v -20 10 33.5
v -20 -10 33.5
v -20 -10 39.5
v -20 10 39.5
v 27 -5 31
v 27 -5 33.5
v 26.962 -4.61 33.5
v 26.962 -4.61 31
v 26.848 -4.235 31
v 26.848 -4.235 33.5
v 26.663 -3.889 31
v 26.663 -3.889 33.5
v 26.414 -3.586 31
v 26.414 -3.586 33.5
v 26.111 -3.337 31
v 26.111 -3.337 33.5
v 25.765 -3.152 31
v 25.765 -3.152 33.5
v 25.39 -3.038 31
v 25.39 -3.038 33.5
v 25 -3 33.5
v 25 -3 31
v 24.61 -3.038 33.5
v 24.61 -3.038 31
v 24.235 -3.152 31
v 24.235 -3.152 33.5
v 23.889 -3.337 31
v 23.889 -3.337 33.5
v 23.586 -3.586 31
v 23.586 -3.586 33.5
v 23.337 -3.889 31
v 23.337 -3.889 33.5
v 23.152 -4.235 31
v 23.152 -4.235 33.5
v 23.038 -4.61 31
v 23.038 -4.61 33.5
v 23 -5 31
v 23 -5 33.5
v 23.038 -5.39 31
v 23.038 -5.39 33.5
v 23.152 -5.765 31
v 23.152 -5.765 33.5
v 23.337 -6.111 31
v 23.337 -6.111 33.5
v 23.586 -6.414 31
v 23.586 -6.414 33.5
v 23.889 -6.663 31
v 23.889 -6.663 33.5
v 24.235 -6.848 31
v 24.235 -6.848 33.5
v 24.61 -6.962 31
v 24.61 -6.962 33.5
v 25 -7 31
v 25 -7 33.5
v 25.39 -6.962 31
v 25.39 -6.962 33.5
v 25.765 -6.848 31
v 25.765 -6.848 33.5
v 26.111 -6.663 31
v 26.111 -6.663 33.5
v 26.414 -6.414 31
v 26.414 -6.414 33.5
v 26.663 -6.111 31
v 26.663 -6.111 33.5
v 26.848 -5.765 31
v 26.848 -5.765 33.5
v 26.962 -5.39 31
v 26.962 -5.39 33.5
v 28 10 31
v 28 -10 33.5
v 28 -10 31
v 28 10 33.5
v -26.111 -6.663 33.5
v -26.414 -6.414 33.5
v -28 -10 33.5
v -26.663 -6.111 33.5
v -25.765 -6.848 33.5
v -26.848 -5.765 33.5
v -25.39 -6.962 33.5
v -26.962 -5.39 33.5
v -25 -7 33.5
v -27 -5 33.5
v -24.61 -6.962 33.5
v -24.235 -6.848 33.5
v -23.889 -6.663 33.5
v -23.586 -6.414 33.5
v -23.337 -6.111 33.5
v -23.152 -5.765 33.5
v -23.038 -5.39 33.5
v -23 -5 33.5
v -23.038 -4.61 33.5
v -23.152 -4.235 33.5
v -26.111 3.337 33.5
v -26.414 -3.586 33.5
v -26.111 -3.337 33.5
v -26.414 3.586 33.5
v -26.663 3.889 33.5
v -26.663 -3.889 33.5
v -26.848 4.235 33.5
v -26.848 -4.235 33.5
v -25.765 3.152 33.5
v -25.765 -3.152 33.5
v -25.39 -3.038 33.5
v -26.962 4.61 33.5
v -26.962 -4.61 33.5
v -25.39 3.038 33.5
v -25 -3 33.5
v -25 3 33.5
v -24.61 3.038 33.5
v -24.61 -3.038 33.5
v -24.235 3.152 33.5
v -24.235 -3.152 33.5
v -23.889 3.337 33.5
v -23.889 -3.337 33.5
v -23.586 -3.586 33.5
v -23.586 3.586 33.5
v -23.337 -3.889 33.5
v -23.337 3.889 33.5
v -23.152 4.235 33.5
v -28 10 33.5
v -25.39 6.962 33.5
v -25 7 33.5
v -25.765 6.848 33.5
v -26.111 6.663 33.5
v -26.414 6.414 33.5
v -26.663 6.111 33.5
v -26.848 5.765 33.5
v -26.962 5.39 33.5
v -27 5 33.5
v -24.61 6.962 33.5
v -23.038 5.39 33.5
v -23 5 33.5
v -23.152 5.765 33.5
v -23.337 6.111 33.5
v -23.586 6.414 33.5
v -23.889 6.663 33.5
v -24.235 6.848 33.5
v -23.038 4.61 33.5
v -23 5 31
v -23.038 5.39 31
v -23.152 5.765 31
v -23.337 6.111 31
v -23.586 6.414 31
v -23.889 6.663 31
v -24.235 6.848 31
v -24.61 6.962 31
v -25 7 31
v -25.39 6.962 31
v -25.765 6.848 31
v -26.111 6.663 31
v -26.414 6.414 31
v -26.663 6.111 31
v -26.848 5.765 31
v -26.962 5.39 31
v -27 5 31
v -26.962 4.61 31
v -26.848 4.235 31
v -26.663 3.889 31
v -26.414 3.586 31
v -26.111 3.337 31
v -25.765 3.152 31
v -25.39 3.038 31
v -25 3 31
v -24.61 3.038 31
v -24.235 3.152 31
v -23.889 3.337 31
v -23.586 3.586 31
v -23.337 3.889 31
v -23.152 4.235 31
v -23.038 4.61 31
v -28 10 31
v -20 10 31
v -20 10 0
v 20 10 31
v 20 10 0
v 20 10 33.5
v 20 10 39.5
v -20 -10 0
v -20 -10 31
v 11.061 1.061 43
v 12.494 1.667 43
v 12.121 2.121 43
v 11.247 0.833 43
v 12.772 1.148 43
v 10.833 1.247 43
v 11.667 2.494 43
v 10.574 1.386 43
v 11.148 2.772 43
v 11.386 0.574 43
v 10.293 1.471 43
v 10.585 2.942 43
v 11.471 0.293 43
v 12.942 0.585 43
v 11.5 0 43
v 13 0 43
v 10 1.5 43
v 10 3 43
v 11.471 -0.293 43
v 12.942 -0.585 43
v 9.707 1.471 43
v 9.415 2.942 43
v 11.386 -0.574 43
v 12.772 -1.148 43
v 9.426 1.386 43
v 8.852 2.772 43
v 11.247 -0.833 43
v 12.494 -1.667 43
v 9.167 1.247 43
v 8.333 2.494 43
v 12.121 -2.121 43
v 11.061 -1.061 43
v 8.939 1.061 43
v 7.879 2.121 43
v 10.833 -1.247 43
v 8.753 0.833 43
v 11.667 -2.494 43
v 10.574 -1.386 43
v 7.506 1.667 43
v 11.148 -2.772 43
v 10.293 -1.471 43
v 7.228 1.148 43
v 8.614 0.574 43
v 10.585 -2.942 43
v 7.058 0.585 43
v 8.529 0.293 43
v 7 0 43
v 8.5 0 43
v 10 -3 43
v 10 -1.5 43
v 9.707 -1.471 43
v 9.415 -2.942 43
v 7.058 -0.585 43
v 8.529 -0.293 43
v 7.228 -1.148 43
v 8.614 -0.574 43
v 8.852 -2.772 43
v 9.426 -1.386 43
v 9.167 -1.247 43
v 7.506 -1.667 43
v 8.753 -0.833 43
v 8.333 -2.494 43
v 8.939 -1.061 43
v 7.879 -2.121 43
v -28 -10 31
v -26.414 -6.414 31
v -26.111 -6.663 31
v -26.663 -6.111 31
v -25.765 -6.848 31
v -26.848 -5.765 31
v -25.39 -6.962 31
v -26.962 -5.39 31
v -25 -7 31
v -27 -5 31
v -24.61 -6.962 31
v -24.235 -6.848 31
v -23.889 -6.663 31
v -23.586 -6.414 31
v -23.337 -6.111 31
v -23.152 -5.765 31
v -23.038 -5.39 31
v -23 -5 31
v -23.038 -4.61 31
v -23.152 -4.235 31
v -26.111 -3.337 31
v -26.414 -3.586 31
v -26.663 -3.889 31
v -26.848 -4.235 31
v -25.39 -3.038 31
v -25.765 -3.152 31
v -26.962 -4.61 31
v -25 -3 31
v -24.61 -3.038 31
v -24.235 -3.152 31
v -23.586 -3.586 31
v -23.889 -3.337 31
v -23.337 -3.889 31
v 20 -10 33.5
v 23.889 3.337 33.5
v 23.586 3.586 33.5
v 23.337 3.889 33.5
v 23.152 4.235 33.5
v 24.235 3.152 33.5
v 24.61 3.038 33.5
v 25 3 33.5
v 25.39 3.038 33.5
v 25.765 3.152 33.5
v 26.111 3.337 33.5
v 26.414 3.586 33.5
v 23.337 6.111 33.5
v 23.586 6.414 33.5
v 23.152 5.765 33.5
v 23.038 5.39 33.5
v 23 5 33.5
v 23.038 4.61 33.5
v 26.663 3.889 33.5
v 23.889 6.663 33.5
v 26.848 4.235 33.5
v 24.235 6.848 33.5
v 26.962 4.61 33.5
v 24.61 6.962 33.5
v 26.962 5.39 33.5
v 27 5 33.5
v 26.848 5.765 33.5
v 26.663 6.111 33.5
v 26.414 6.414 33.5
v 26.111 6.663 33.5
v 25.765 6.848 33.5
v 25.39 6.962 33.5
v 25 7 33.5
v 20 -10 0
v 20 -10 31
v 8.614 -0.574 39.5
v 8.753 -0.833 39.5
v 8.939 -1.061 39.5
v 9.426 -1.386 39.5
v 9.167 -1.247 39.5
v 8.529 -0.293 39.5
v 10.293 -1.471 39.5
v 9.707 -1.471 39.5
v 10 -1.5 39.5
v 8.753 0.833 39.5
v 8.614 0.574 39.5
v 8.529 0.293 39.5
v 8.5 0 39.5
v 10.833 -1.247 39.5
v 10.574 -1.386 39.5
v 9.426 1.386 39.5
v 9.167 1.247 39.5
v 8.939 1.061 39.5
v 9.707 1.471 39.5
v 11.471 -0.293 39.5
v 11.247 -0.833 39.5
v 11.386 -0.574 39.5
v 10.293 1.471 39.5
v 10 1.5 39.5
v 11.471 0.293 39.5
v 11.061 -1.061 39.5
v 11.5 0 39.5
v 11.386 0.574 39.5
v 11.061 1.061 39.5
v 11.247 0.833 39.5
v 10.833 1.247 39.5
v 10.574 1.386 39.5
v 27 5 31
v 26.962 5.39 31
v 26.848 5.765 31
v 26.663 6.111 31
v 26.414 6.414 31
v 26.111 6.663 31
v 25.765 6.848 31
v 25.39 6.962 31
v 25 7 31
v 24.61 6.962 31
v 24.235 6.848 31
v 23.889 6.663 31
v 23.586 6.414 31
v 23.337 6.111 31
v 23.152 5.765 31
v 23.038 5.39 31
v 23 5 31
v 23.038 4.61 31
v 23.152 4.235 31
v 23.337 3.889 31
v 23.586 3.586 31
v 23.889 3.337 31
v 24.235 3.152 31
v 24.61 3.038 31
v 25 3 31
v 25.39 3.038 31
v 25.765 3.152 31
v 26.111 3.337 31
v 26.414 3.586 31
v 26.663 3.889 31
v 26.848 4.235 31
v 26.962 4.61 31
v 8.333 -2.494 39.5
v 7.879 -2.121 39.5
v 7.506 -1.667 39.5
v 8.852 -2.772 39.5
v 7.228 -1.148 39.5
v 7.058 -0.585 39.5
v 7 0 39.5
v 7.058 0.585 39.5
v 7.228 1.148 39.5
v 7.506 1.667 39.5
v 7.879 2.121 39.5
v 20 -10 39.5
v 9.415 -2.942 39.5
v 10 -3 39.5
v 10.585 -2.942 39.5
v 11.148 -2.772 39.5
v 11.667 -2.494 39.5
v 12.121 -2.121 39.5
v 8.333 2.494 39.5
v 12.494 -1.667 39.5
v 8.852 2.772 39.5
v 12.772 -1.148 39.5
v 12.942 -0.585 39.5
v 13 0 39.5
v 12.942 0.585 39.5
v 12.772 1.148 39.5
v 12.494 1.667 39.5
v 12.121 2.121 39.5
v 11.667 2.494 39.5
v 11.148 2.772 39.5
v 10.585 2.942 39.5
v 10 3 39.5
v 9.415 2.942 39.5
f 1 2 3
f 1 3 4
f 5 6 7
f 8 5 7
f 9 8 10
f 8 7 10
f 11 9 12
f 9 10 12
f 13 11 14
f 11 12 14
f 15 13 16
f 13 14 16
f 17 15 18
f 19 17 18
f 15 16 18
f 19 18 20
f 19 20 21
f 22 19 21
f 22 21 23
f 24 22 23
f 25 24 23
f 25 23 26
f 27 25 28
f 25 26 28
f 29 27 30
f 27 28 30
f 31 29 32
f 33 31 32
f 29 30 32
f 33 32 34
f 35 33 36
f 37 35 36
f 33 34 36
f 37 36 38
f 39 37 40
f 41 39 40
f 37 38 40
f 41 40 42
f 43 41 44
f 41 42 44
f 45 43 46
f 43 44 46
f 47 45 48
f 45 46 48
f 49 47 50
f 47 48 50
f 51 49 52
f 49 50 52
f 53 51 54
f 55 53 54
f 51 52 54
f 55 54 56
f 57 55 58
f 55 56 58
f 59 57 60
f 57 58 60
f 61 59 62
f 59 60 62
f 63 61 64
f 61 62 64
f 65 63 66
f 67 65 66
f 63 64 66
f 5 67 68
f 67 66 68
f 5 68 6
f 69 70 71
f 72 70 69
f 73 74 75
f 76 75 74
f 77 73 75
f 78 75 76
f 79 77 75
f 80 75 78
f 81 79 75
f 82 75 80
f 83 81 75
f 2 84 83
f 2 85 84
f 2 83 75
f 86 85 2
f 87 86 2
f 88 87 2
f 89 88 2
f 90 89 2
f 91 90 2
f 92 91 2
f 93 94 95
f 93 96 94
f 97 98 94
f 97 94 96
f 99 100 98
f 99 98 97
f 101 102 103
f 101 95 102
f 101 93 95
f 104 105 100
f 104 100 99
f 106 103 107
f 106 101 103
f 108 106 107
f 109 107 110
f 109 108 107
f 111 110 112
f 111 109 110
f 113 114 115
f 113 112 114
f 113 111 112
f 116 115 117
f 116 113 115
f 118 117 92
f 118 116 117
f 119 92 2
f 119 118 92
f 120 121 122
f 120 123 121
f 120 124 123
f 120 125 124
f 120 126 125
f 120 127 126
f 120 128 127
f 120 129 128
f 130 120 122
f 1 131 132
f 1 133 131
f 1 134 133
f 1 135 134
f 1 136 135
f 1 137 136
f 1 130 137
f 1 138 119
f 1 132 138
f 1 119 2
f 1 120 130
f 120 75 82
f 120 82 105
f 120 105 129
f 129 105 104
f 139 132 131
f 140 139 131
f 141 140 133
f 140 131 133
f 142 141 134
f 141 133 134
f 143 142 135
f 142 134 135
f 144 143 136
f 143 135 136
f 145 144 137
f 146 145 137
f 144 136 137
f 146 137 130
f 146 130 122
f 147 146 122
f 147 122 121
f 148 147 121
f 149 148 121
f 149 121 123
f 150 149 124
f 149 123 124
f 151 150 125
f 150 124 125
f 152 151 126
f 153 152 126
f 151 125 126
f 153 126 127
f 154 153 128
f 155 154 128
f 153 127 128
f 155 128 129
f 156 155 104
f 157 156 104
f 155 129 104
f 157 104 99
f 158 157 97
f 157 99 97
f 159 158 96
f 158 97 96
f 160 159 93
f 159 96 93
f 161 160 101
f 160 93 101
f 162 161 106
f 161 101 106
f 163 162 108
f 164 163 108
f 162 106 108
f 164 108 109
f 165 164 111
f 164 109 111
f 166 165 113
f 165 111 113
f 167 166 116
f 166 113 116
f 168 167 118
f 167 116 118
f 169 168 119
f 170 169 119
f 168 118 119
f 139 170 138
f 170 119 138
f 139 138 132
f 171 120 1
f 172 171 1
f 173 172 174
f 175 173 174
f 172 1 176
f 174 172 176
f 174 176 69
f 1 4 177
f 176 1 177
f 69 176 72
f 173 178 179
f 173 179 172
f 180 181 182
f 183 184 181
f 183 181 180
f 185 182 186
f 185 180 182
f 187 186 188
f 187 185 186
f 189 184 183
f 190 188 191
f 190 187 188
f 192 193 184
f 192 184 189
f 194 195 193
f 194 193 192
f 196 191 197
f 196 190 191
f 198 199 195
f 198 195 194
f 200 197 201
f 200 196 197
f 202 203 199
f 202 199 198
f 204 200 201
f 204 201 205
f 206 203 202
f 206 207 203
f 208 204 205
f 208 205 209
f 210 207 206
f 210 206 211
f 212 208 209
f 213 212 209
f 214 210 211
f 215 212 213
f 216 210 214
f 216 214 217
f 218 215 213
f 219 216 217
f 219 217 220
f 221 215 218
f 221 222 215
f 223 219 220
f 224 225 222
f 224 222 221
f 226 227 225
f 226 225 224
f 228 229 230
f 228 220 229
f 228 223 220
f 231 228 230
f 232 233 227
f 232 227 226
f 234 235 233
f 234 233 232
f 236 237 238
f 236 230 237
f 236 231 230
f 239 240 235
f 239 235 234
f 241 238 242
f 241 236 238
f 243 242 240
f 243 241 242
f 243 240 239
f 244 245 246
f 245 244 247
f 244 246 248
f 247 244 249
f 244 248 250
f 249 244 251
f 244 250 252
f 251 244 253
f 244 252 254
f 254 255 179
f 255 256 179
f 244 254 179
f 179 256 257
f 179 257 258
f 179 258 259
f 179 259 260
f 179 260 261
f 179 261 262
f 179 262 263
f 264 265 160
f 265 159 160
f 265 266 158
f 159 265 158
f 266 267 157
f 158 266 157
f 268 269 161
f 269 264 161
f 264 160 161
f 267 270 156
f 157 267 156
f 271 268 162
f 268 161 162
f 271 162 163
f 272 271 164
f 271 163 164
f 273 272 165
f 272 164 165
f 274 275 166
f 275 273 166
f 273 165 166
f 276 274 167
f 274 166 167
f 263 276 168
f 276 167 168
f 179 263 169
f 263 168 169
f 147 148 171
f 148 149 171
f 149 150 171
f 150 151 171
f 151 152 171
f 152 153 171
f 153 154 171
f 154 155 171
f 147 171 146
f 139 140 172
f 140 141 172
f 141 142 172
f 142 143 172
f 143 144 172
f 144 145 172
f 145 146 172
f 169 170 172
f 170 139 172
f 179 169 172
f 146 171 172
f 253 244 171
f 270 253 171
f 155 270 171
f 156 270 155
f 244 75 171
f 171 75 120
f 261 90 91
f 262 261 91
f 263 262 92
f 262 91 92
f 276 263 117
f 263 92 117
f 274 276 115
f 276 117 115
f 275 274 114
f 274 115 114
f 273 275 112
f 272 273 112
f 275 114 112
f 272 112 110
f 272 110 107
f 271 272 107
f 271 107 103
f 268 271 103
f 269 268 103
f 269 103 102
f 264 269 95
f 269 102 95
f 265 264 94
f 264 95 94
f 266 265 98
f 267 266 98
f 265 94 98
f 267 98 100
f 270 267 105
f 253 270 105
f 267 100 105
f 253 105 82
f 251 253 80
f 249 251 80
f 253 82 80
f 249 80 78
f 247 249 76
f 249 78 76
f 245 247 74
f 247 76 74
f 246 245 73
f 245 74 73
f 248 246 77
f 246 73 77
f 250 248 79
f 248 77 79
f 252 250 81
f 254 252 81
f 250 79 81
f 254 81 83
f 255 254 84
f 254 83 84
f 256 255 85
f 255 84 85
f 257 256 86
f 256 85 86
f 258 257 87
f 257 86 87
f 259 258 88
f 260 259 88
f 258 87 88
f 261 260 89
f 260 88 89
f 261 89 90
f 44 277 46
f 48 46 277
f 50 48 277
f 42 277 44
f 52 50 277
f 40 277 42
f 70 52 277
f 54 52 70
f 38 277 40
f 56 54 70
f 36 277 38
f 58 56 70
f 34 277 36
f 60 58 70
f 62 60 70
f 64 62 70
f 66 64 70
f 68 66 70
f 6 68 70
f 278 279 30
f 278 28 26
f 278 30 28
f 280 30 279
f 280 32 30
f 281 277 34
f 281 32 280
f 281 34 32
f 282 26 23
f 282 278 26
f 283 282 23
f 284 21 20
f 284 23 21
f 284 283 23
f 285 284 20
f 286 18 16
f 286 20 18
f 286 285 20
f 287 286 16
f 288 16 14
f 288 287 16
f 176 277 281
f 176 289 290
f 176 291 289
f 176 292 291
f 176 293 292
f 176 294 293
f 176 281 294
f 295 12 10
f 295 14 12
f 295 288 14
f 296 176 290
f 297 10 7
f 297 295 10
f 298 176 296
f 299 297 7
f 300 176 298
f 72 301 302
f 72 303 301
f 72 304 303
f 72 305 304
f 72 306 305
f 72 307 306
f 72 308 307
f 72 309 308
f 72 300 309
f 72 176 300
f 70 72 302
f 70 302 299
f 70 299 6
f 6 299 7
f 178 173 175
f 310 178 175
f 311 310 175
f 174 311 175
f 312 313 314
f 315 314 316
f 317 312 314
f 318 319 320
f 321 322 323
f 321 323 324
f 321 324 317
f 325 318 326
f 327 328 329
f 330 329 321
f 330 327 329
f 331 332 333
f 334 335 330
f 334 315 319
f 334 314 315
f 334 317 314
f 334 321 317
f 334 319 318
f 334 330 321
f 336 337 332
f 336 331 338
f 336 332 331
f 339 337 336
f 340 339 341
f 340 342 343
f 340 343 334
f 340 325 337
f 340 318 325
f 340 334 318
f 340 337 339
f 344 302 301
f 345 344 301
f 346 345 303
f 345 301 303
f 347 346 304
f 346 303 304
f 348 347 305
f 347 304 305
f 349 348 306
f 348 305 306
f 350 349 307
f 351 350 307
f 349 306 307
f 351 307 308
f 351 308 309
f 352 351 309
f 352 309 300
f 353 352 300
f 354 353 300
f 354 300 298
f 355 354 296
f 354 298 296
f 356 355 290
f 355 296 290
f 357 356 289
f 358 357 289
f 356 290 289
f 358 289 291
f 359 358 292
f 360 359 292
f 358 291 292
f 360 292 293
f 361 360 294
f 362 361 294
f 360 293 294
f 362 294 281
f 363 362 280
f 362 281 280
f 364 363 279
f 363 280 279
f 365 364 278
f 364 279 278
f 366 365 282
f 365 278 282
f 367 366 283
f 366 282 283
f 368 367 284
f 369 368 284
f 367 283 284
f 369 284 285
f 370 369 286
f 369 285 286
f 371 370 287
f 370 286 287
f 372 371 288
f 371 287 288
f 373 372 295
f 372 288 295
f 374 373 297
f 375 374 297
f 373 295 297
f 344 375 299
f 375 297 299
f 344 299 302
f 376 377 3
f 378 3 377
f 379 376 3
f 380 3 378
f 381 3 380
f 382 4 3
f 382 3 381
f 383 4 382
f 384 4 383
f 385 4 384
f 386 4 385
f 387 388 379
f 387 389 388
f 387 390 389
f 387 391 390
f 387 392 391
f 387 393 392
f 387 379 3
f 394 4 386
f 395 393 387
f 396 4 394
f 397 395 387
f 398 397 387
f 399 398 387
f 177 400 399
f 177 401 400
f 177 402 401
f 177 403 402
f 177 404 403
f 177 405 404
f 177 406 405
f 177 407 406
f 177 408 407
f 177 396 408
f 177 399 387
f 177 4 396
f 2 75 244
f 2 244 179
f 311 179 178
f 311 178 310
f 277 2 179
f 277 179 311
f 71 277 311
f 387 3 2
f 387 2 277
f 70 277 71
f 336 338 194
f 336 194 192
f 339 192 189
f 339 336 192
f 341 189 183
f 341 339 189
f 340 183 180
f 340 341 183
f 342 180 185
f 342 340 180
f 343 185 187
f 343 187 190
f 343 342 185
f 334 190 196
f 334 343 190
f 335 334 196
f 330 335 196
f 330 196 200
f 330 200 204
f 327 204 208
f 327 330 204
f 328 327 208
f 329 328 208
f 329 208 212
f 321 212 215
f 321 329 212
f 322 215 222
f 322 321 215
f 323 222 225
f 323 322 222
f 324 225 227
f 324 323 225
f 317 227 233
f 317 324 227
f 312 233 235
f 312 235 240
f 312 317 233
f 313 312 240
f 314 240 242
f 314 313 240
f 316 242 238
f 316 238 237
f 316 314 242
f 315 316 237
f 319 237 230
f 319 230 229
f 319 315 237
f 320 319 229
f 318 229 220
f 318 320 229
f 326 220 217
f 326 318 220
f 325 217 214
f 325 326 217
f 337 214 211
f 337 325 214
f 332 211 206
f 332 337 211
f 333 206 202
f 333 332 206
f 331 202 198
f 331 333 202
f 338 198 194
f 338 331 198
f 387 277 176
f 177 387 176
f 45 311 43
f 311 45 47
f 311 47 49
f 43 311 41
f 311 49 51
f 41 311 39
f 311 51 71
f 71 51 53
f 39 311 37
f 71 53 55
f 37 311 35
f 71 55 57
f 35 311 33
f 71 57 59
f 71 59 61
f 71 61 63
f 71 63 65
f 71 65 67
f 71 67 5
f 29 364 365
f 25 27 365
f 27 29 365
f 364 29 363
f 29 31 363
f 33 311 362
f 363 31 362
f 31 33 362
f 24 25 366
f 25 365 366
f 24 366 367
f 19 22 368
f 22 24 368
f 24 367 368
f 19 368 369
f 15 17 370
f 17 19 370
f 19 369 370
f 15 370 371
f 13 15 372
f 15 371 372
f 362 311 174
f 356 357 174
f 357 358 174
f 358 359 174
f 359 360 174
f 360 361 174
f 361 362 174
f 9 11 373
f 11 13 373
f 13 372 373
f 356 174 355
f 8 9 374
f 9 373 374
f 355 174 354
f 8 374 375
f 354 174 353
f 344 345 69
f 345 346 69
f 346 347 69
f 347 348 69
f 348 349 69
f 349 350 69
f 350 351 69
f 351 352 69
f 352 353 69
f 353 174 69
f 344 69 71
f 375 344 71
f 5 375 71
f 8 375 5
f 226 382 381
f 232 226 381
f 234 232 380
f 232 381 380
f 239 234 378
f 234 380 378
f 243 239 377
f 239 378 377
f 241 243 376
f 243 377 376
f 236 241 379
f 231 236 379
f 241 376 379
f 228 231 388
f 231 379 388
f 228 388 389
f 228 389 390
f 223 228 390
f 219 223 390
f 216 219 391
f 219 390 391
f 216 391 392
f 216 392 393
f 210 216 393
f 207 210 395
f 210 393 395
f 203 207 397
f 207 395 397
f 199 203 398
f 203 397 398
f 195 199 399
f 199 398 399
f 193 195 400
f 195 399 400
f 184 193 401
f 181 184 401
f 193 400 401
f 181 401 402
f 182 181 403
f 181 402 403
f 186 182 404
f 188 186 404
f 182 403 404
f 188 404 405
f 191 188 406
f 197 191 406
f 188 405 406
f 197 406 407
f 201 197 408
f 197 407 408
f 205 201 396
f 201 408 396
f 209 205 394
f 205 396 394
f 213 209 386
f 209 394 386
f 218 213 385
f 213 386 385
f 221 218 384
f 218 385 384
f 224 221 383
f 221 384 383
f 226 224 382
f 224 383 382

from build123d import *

# Parameters (mm, degrees)
SKETCH_1_W      = 40
SKETCH_1_H      = 20
EXTRUDE_1_DEPTH = 39.5
SKETCH_2_R      = 3
SKETCH_2_R_2    = 1.5
EXTRUDE_2_DEPTH = 3.5
SKETCH_4_W      = 56
SKETCH_4_H      = 20
SKETCH_4_R      = 2
EXTRUDE_3_DEPTH = 2.5


with BuildPart() as part:
    # 草图1 → 凸台-拉伸1 (new body)
    with BuildSketch(Plane.XY):
        Rectangle(SKETCH_1_W, SKETCH_1_H)
    extrude(amount=EXTRUDE_1_DEPTH)

    # 草图2 → 凸台-拉伸2 (add)
    with BuildSketch(Plane.XY.offset(39.5)):
        with Locations(Location((10, 0, 0), (0, 0, 180))):
            Circle(SKETCH_2_R)
        with Locations((10, 0)):
            Circle(SKETCH_2_R_2, mode=Mode.SUBTRACT)
    extrude(amount=EXTRUDE_2_DEPTH)

    # 草图4 → 凸台-拉伸3 (add)
    with BuildSketch(Plane.XY.offset(33.5)):
        Rectangle(SKETCH_4_W, SKETCH_4_H)
        with Locations((25, 5)):
            Circle(SKETCH_4_R, mode=Mode.SUBTRACT)
        with Locations((25, -5)):
            Circle(SKETCH_4_R, mode=Mode.SUBTRACT)
        with Locations((-25, 5)):
            Circle(SKETCH_4_R, mode=Mode.SUBTRACT)
        with Locations((-25, -5)):
            Circle(SKETCH_4_R, mode=Mode.SUBTRACT)
    extrude(amount=-EXTRUDE_3_DEPTH)


solid = part.part
